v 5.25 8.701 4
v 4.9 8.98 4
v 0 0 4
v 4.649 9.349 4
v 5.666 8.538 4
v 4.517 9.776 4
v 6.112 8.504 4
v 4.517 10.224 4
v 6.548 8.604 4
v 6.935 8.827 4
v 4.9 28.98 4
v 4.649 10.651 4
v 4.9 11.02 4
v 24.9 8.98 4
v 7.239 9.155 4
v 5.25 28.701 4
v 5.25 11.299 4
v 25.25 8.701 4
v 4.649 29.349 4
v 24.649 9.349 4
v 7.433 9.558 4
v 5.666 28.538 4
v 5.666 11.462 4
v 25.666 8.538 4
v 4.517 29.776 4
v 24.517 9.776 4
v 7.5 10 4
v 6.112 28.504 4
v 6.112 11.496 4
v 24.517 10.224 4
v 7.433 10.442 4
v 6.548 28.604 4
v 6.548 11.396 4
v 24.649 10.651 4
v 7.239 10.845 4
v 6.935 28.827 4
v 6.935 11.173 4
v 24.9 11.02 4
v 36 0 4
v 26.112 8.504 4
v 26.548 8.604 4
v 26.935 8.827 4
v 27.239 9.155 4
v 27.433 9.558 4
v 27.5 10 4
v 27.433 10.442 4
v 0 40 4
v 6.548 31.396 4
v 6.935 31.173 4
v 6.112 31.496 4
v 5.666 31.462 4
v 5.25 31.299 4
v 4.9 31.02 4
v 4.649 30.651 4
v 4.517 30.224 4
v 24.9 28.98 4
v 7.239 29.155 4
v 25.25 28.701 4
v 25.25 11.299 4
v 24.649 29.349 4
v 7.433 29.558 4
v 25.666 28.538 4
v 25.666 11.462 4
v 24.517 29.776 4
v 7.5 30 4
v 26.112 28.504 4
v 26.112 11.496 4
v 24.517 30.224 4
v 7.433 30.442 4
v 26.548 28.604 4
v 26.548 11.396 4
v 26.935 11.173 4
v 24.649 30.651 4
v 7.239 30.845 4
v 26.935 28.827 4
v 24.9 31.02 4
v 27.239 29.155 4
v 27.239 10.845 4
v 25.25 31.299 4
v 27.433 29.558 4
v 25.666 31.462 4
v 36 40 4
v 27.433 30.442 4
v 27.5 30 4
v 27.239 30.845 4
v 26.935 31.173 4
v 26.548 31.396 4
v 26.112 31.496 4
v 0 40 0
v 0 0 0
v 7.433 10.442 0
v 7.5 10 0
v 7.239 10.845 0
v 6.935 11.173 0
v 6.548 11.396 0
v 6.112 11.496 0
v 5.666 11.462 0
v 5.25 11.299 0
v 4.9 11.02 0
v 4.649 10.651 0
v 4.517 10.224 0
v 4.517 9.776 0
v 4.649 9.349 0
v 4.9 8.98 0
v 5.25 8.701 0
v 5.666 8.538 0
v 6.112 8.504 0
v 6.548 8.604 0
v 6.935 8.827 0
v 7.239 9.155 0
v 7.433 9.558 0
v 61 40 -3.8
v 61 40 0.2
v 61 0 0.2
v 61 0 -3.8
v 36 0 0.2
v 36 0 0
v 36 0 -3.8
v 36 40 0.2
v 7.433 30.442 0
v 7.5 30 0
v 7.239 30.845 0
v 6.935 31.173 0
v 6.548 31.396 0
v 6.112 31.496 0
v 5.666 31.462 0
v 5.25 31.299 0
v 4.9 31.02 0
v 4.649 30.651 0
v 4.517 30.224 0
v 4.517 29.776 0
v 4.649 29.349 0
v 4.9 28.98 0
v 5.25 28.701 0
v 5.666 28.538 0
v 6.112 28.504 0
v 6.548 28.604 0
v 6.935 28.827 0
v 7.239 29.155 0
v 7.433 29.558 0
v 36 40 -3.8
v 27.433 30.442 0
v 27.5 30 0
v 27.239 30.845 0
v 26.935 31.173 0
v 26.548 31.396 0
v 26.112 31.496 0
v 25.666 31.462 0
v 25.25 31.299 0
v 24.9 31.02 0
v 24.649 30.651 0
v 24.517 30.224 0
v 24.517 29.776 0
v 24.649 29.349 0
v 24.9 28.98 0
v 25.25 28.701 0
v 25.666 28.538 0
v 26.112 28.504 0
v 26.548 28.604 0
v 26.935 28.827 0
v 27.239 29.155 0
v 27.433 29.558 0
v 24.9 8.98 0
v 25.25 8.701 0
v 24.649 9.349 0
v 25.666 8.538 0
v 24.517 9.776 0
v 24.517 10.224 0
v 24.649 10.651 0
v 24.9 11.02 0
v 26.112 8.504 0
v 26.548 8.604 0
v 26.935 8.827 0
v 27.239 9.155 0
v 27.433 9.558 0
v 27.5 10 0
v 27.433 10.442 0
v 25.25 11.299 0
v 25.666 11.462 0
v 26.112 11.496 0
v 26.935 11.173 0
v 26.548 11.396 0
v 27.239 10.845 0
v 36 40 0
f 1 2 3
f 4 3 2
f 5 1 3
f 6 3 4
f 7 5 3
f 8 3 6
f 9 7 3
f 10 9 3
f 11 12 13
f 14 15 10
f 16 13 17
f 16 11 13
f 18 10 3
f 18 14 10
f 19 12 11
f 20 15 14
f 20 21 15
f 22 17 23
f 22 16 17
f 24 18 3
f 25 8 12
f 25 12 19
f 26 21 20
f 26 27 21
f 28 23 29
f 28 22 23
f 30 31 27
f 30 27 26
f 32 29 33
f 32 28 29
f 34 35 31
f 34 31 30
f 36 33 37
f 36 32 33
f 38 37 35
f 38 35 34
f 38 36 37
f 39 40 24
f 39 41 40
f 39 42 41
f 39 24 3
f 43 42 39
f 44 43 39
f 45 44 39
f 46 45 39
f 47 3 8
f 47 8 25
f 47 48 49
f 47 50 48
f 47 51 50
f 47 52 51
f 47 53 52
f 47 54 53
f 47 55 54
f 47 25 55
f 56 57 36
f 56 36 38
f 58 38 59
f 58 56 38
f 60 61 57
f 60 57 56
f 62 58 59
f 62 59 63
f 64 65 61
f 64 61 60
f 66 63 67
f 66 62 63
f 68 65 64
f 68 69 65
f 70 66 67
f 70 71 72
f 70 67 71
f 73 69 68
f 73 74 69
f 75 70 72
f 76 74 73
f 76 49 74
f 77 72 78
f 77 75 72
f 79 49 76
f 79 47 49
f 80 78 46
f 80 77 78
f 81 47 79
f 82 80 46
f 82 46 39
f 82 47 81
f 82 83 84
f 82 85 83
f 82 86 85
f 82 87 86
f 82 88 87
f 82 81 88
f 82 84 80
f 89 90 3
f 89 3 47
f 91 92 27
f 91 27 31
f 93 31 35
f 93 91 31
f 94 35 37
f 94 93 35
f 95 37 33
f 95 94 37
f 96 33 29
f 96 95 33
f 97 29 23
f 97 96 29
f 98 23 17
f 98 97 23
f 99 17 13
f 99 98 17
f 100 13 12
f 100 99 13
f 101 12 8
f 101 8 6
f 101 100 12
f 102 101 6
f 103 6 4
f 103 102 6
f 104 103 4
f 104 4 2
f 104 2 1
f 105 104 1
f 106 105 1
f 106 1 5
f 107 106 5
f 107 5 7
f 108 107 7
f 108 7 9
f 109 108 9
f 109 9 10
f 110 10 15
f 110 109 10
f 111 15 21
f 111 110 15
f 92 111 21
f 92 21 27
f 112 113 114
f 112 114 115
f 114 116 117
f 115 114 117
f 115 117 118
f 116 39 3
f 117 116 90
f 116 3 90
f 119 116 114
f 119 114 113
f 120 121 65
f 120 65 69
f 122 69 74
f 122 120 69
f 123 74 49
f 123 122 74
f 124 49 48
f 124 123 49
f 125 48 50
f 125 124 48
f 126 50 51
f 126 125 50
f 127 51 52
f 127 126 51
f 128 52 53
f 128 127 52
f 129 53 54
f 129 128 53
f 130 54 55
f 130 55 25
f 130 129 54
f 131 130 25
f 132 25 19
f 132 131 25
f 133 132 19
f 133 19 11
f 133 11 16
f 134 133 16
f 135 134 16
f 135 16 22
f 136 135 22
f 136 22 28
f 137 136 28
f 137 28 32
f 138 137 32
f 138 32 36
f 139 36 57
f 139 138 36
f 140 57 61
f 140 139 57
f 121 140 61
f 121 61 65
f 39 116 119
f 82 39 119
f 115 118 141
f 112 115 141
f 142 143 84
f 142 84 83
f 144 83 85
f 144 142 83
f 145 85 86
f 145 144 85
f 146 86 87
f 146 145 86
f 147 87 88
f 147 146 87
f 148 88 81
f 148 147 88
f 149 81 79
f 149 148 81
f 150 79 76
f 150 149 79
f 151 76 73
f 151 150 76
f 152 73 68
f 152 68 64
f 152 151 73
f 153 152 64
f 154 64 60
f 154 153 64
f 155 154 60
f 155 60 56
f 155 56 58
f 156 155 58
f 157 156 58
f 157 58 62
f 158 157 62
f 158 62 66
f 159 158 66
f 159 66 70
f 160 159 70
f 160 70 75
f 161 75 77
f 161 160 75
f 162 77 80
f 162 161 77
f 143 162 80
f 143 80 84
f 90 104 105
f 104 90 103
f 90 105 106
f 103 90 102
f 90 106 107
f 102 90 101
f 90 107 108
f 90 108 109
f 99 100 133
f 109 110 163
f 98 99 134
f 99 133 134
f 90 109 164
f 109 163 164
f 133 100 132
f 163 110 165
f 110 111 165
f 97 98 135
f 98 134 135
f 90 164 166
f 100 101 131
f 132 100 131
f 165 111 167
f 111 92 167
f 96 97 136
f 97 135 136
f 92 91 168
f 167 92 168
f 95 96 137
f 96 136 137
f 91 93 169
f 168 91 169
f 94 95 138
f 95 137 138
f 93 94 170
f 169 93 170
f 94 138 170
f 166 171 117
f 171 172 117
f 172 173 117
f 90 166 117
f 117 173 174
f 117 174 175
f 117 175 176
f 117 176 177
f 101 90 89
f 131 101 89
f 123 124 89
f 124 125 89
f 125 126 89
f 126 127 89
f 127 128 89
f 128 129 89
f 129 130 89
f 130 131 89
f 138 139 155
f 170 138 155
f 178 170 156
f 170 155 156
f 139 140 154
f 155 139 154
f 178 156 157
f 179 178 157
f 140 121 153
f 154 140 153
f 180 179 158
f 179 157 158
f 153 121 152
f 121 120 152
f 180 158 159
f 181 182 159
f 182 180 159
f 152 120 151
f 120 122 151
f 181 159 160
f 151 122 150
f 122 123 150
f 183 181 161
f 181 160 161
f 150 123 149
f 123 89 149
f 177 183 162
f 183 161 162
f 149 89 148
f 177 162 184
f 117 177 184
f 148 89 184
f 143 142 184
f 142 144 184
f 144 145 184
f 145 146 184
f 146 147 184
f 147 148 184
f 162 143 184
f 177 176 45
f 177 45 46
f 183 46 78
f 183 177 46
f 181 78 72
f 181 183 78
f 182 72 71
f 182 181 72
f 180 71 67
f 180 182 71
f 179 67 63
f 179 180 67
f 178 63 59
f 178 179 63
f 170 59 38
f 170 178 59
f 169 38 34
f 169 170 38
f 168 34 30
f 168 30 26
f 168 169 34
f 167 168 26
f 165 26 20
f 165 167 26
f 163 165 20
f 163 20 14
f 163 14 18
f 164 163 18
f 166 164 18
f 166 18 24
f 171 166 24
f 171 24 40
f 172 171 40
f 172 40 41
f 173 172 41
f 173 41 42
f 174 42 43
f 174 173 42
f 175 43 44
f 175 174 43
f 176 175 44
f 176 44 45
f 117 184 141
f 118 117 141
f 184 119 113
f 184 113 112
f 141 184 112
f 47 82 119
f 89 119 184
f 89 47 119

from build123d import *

# Parameters (mm, degrees)
SKETCH_1_W      = 36
SKETCH_1_H      = 40
SKETCH_1_R      = 1.5
EXTRUDE_1_DEPTH = 4
SKETCH_13_W     = 4
SKETCH_13_H     = 40
EXTRUDE_2_DEPTH = 25


with BuildPart() as part:
    # Эскиз1 → Бобышка-Вытянуть1 (new body)
    with BuildSketch(Plane.XY):
        with Locations((18, 20)):
            Rectangle(SKETCH_1_W, SKETCH_1_H)
        with Locations((6, 30)):
            Circle(SKETCH_1_R, mode=Mode.SUBTRACT)
        with Locations((26, 30)):
            Circle(SKETCH_1_R, mode=Mode.SUBTRACT)
        with Locations((26, 10)):
            Circle(SKETCH_1_R, mode=Mode.SUBTRACT)
        with Locations((6, 10)):
            Circle(SKETCH_1_R, mode=Mode.SUBTRACT)
    extrude(amount=EXTRUDE_1_DEPTH)

    # Эскиз13 → Бобышка-Вытянуть2 (add)
    with BuildSketch(Plane(origin=(36, 0, 0), x_dir=(0, 0, -1), z_dir=(1, 0, 0))):
        with Locations((1.8, 20)):
            Rectangle(SKETCH_13_W, SKETCH_13_H)
    extrude(amount=EXTRUDE_2_DEPTH)


solid = part.part
